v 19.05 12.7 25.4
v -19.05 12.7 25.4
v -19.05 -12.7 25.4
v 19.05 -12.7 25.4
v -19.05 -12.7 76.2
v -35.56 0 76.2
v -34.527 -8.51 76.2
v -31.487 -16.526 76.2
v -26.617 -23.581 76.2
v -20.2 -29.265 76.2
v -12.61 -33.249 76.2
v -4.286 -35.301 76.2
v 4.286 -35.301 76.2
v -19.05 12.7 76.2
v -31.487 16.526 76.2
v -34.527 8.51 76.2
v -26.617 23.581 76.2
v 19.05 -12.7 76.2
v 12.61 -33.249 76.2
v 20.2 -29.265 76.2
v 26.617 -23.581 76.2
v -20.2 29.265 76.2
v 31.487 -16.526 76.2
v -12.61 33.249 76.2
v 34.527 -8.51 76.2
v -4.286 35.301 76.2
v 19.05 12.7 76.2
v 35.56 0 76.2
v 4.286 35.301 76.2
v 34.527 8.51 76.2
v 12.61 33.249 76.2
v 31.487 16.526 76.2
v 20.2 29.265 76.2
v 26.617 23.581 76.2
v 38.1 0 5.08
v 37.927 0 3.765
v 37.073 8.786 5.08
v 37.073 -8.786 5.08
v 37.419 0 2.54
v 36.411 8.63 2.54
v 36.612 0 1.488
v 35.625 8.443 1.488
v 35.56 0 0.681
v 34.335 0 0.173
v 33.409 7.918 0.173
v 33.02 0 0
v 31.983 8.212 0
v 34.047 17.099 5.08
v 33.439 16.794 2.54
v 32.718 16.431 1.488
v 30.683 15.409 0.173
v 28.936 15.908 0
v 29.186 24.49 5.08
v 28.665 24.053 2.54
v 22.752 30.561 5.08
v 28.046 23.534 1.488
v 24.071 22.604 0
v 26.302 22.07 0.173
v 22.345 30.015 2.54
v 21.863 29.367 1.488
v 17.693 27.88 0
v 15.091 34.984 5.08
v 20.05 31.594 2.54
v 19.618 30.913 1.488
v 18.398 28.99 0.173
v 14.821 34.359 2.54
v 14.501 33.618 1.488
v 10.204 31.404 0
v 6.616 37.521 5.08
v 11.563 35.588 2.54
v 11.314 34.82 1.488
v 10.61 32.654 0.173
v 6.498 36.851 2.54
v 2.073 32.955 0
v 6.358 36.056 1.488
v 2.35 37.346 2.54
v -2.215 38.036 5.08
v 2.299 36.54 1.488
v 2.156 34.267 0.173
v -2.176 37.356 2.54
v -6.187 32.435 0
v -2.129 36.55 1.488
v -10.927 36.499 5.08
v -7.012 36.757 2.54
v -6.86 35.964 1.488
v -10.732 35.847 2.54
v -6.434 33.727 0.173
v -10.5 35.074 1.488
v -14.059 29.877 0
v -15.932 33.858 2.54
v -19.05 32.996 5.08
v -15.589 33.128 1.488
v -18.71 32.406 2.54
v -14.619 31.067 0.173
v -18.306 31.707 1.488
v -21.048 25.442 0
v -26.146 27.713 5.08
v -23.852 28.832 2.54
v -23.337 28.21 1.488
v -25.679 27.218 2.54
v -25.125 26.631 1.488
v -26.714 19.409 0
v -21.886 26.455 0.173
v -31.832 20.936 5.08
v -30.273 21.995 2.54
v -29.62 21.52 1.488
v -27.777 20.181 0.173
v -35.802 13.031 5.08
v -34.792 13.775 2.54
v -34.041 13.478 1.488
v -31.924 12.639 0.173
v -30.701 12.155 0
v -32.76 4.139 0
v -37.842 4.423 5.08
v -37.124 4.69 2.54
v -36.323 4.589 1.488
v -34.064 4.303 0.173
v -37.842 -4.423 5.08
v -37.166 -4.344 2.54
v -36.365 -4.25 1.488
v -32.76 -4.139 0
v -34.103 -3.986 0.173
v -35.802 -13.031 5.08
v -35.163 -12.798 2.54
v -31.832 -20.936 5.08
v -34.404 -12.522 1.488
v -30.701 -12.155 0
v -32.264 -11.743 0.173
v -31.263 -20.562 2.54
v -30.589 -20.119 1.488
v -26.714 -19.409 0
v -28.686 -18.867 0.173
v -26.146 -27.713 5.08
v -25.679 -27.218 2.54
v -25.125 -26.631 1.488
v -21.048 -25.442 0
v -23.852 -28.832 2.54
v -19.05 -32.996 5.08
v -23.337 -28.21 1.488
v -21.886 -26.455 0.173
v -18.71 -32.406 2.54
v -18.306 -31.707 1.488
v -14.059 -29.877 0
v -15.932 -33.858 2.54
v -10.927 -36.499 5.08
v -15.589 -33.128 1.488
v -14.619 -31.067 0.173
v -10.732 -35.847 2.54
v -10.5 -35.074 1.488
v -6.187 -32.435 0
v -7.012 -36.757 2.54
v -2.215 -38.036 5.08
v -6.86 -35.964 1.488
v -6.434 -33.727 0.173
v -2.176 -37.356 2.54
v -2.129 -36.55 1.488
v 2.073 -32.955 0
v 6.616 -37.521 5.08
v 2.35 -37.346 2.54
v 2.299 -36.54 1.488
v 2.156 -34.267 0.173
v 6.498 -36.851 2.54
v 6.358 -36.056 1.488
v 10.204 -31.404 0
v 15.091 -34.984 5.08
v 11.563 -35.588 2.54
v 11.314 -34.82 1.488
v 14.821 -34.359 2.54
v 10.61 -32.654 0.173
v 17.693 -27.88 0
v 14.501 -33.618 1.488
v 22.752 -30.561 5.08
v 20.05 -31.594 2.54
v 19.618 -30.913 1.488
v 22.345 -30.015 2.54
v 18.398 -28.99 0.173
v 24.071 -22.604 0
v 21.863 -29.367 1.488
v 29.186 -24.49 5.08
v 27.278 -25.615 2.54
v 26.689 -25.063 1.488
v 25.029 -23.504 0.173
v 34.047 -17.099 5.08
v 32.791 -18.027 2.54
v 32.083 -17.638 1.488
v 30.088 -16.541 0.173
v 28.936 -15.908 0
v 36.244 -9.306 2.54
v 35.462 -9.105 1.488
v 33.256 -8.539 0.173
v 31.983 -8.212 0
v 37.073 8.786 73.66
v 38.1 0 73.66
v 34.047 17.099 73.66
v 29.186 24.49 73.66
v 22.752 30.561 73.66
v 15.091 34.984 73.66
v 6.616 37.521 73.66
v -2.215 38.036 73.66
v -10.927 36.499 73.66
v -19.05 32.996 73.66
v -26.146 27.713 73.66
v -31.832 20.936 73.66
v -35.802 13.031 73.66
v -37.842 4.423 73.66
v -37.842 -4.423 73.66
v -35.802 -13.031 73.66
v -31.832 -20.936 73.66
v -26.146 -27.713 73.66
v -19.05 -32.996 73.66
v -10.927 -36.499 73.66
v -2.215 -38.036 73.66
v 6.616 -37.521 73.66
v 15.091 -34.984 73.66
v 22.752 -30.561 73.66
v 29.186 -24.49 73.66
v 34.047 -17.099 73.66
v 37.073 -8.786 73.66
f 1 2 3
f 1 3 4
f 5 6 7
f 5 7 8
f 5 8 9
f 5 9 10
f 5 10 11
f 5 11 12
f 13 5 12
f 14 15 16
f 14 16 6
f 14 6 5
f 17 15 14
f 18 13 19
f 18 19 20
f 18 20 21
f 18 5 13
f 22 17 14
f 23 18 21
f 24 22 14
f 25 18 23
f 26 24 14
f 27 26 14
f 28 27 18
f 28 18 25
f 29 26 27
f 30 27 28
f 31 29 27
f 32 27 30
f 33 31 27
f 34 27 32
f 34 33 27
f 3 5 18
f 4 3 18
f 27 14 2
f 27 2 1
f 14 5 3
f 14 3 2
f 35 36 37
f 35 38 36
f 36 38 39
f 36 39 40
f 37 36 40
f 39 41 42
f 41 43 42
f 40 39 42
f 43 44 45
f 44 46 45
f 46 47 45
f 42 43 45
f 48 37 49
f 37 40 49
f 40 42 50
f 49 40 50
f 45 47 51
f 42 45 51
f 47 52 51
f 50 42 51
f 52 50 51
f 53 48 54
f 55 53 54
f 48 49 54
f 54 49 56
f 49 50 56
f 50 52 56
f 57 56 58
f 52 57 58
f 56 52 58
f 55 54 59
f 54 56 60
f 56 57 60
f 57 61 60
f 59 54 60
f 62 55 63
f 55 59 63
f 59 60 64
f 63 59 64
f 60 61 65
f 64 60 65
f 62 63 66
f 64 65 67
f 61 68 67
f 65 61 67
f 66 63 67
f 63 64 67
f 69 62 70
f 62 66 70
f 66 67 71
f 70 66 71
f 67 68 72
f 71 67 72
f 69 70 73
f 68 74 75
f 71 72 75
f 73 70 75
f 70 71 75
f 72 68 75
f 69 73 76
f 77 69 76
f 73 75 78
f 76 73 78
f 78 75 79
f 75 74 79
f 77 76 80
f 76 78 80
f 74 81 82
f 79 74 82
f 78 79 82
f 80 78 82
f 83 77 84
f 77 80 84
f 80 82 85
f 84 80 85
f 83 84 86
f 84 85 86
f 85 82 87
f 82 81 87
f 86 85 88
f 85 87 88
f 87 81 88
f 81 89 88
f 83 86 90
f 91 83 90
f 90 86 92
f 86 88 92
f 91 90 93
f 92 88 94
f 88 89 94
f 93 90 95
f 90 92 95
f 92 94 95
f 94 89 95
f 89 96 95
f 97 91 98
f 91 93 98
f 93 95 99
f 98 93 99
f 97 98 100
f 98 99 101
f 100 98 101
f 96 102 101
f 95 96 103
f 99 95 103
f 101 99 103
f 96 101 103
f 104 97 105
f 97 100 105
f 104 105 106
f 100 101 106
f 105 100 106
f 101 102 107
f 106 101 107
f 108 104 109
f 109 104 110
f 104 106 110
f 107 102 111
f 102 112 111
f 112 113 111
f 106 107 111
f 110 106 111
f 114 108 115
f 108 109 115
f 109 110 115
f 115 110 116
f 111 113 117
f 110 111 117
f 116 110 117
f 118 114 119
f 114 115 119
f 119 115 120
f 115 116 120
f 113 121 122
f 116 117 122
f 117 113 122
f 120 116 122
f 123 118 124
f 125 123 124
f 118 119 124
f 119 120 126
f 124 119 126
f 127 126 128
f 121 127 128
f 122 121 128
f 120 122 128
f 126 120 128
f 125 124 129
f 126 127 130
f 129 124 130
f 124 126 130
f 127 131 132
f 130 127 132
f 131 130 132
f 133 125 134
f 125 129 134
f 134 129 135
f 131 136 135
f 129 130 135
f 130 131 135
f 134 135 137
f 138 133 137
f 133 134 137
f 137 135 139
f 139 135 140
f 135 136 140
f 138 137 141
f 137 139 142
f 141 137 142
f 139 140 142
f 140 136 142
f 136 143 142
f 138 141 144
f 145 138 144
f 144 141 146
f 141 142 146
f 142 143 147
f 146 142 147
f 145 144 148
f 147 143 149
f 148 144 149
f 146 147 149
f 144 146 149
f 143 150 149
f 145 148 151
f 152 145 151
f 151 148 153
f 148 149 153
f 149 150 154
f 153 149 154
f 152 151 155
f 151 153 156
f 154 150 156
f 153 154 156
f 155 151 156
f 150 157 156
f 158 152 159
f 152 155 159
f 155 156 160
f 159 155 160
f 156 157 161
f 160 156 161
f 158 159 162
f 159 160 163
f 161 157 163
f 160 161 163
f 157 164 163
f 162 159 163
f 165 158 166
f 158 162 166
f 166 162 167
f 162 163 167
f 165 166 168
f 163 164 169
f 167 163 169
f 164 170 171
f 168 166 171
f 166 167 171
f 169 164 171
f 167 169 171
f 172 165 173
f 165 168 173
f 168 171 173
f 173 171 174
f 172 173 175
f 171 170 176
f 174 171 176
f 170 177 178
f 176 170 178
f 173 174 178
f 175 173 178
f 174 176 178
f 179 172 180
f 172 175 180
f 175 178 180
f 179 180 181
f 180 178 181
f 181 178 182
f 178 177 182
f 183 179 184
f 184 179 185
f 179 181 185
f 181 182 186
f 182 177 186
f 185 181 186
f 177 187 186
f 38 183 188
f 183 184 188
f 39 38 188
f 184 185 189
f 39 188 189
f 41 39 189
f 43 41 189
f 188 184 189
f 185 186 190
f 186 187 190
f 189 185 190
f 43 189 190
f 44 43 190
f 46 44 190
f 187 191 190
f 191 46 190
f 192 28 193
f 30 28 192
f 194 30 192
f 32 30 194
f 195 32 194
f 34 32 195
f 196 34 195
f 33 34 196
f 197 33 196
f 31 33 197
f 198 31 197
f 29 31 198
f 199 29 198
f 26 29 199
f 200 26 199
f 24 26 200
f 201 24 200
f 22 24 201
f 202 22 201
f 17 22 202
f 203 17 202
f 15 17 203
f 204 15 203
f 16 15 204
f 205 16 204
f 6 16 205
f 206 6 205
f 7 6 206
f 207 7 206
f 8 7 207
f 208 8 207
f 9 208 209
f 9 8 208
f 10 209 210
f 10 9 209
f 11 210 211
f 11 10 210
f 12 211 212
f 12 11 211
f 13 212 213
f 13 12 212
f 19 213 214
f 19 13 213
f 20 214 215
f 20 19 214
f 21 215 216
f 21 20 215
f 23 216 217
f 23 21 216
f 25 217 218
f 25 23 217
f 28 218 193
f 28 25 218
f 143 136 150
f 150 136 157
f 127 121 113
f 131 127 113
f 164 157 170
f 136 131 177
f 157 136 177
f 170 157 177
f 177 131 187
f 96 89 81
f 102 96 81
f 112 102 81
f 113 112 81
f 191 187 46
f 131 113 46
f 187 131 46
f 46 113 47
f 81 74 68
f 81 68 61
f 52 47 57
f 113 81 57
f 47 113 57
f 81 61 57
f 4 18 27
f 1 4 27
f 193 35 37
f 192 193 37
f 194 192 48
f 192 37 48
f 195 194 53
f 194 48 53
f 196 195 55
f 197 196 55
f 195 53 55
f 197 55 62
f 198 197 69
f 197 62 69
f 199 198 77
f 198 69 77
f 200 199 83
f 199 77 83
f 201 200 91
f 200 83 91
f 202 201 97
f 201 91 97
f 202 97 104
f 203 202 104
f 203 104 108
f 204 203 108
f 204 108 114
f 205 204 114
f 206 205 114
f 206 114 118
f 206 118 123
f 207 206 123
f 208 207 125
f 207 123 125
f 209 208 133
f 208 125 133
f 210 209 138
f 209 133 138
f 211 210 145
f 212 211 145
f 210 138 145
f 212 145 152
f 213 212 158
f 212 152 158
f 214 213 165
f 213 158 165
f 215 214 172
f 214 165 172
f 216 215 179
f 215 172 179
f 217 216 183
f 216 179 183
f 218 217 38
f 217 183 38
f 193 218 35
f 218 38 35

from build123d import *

# Parameters (mm, degrees)
F0_R     = 38.1
F1_DEPTH = 76.2
F2_W     = 38.1
F2_H     = 25.4
F3_DEPTH = 50.8
F4_SIZE  = 2.54
F5_R     = 5.08


with BuildPart() as f1:
    # F0 (on Top) → F1 (new body)
    with BuildSketch(Plane.XY):
        Circle(F0_R)
    extrude(amount=F1_DEPTH)

    # F2 (on face) → F3 (cut)
    with BuildSketch(Plane.XY.offset(76.2)):
        Rectangle(F2_W, F2_H)
    extrude(amount=-F3_DEPTH, mode=Mode.SUBTRACT)

    # F4
    f4_edges = [f1.edges().sort_by_distance(p)[0] for p in [
        (-38.1, 0, 76.2),
    ]]
    chamfer(f4_edges, length=F4_SIZE)

    # F5
    f5_edges = [f1.edges().sort_by_distance(p)[0] for p in [
        (-38.1, 0, 0),
    ]]
    fillet(f5_edges, radius=F5_R)


solid = f1.part
